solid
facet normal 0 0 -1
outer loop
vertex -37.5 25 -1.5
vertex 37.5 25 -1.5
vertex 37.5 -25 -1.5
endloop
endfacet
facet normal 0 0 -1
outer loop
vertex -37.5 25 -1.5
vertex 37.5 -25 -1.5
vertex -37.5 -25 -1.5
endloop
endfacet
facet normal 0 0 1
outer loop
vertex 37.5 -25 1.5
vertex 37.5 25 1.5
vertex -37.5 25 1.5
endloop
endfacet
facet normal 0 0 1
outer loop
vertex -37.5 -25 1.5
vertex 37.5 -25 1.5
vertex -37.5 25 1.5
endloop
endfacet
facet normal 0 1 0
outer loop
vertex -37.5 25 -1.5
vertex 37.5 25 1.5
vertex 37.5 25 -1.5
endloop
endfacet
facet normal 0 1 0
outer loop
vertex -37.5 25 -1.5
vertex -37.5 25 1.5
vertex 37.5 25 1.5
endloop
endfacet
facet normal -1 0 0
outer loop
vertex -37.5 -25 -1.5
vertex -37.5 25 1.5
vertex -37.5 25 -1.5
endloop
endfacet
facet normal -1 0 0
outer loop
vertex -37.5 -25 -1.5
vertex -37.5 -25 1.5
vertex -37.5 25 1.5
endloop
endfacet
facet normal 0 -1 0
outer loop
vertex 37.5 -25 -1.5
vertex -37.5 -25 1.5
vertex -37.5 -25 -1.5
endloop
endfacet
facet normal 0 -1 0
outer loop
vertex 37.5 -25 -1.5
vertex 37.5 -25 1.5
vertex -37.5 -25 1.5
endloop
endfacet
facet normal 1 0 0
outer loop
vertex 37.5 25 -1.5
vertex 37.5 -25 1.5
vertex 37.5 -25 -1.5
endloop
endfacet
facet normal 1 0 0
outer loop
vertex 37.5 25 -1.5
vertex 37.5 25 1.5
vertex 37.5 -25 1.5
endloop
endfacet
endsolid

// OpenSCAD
/*
 * Leather embossing
 */
echo(version=version());

// Base plate
// ----------
plateWidth = 75;    // 50
plateLength = 50;   // 50
plateThickNess = 3;
cornerRadius = 0; // 10;

logo = "./images/onecamel.inv.2.png"; 
imgRatio = 1.2;
logox = 448 * imgRatio; 
logoy = 450 * imgRatio; 

module roundedRect(size, radius) {  
	linear_extrude(height=size.z, center=true) {
		offset(radius) offset(-radius) {
			square([size.x, size.y], center = true);
		}
	}
}

difference() {  
	union() {
		//difference() {
			roundedRect([plateWidth, plateLength, plateThickNess], cornerRadius);
			translate([0, 0, 2.9]) {
				scale([.9 * plateWidth / logox, .9 * plateWidth / logoy, .02]) {
					//color("white") {
						rotate([0, 0, -90]) {
							surface(file=logo, invert=true, center=true);
						}
					//}
				}
			}
		//}
	}
}
